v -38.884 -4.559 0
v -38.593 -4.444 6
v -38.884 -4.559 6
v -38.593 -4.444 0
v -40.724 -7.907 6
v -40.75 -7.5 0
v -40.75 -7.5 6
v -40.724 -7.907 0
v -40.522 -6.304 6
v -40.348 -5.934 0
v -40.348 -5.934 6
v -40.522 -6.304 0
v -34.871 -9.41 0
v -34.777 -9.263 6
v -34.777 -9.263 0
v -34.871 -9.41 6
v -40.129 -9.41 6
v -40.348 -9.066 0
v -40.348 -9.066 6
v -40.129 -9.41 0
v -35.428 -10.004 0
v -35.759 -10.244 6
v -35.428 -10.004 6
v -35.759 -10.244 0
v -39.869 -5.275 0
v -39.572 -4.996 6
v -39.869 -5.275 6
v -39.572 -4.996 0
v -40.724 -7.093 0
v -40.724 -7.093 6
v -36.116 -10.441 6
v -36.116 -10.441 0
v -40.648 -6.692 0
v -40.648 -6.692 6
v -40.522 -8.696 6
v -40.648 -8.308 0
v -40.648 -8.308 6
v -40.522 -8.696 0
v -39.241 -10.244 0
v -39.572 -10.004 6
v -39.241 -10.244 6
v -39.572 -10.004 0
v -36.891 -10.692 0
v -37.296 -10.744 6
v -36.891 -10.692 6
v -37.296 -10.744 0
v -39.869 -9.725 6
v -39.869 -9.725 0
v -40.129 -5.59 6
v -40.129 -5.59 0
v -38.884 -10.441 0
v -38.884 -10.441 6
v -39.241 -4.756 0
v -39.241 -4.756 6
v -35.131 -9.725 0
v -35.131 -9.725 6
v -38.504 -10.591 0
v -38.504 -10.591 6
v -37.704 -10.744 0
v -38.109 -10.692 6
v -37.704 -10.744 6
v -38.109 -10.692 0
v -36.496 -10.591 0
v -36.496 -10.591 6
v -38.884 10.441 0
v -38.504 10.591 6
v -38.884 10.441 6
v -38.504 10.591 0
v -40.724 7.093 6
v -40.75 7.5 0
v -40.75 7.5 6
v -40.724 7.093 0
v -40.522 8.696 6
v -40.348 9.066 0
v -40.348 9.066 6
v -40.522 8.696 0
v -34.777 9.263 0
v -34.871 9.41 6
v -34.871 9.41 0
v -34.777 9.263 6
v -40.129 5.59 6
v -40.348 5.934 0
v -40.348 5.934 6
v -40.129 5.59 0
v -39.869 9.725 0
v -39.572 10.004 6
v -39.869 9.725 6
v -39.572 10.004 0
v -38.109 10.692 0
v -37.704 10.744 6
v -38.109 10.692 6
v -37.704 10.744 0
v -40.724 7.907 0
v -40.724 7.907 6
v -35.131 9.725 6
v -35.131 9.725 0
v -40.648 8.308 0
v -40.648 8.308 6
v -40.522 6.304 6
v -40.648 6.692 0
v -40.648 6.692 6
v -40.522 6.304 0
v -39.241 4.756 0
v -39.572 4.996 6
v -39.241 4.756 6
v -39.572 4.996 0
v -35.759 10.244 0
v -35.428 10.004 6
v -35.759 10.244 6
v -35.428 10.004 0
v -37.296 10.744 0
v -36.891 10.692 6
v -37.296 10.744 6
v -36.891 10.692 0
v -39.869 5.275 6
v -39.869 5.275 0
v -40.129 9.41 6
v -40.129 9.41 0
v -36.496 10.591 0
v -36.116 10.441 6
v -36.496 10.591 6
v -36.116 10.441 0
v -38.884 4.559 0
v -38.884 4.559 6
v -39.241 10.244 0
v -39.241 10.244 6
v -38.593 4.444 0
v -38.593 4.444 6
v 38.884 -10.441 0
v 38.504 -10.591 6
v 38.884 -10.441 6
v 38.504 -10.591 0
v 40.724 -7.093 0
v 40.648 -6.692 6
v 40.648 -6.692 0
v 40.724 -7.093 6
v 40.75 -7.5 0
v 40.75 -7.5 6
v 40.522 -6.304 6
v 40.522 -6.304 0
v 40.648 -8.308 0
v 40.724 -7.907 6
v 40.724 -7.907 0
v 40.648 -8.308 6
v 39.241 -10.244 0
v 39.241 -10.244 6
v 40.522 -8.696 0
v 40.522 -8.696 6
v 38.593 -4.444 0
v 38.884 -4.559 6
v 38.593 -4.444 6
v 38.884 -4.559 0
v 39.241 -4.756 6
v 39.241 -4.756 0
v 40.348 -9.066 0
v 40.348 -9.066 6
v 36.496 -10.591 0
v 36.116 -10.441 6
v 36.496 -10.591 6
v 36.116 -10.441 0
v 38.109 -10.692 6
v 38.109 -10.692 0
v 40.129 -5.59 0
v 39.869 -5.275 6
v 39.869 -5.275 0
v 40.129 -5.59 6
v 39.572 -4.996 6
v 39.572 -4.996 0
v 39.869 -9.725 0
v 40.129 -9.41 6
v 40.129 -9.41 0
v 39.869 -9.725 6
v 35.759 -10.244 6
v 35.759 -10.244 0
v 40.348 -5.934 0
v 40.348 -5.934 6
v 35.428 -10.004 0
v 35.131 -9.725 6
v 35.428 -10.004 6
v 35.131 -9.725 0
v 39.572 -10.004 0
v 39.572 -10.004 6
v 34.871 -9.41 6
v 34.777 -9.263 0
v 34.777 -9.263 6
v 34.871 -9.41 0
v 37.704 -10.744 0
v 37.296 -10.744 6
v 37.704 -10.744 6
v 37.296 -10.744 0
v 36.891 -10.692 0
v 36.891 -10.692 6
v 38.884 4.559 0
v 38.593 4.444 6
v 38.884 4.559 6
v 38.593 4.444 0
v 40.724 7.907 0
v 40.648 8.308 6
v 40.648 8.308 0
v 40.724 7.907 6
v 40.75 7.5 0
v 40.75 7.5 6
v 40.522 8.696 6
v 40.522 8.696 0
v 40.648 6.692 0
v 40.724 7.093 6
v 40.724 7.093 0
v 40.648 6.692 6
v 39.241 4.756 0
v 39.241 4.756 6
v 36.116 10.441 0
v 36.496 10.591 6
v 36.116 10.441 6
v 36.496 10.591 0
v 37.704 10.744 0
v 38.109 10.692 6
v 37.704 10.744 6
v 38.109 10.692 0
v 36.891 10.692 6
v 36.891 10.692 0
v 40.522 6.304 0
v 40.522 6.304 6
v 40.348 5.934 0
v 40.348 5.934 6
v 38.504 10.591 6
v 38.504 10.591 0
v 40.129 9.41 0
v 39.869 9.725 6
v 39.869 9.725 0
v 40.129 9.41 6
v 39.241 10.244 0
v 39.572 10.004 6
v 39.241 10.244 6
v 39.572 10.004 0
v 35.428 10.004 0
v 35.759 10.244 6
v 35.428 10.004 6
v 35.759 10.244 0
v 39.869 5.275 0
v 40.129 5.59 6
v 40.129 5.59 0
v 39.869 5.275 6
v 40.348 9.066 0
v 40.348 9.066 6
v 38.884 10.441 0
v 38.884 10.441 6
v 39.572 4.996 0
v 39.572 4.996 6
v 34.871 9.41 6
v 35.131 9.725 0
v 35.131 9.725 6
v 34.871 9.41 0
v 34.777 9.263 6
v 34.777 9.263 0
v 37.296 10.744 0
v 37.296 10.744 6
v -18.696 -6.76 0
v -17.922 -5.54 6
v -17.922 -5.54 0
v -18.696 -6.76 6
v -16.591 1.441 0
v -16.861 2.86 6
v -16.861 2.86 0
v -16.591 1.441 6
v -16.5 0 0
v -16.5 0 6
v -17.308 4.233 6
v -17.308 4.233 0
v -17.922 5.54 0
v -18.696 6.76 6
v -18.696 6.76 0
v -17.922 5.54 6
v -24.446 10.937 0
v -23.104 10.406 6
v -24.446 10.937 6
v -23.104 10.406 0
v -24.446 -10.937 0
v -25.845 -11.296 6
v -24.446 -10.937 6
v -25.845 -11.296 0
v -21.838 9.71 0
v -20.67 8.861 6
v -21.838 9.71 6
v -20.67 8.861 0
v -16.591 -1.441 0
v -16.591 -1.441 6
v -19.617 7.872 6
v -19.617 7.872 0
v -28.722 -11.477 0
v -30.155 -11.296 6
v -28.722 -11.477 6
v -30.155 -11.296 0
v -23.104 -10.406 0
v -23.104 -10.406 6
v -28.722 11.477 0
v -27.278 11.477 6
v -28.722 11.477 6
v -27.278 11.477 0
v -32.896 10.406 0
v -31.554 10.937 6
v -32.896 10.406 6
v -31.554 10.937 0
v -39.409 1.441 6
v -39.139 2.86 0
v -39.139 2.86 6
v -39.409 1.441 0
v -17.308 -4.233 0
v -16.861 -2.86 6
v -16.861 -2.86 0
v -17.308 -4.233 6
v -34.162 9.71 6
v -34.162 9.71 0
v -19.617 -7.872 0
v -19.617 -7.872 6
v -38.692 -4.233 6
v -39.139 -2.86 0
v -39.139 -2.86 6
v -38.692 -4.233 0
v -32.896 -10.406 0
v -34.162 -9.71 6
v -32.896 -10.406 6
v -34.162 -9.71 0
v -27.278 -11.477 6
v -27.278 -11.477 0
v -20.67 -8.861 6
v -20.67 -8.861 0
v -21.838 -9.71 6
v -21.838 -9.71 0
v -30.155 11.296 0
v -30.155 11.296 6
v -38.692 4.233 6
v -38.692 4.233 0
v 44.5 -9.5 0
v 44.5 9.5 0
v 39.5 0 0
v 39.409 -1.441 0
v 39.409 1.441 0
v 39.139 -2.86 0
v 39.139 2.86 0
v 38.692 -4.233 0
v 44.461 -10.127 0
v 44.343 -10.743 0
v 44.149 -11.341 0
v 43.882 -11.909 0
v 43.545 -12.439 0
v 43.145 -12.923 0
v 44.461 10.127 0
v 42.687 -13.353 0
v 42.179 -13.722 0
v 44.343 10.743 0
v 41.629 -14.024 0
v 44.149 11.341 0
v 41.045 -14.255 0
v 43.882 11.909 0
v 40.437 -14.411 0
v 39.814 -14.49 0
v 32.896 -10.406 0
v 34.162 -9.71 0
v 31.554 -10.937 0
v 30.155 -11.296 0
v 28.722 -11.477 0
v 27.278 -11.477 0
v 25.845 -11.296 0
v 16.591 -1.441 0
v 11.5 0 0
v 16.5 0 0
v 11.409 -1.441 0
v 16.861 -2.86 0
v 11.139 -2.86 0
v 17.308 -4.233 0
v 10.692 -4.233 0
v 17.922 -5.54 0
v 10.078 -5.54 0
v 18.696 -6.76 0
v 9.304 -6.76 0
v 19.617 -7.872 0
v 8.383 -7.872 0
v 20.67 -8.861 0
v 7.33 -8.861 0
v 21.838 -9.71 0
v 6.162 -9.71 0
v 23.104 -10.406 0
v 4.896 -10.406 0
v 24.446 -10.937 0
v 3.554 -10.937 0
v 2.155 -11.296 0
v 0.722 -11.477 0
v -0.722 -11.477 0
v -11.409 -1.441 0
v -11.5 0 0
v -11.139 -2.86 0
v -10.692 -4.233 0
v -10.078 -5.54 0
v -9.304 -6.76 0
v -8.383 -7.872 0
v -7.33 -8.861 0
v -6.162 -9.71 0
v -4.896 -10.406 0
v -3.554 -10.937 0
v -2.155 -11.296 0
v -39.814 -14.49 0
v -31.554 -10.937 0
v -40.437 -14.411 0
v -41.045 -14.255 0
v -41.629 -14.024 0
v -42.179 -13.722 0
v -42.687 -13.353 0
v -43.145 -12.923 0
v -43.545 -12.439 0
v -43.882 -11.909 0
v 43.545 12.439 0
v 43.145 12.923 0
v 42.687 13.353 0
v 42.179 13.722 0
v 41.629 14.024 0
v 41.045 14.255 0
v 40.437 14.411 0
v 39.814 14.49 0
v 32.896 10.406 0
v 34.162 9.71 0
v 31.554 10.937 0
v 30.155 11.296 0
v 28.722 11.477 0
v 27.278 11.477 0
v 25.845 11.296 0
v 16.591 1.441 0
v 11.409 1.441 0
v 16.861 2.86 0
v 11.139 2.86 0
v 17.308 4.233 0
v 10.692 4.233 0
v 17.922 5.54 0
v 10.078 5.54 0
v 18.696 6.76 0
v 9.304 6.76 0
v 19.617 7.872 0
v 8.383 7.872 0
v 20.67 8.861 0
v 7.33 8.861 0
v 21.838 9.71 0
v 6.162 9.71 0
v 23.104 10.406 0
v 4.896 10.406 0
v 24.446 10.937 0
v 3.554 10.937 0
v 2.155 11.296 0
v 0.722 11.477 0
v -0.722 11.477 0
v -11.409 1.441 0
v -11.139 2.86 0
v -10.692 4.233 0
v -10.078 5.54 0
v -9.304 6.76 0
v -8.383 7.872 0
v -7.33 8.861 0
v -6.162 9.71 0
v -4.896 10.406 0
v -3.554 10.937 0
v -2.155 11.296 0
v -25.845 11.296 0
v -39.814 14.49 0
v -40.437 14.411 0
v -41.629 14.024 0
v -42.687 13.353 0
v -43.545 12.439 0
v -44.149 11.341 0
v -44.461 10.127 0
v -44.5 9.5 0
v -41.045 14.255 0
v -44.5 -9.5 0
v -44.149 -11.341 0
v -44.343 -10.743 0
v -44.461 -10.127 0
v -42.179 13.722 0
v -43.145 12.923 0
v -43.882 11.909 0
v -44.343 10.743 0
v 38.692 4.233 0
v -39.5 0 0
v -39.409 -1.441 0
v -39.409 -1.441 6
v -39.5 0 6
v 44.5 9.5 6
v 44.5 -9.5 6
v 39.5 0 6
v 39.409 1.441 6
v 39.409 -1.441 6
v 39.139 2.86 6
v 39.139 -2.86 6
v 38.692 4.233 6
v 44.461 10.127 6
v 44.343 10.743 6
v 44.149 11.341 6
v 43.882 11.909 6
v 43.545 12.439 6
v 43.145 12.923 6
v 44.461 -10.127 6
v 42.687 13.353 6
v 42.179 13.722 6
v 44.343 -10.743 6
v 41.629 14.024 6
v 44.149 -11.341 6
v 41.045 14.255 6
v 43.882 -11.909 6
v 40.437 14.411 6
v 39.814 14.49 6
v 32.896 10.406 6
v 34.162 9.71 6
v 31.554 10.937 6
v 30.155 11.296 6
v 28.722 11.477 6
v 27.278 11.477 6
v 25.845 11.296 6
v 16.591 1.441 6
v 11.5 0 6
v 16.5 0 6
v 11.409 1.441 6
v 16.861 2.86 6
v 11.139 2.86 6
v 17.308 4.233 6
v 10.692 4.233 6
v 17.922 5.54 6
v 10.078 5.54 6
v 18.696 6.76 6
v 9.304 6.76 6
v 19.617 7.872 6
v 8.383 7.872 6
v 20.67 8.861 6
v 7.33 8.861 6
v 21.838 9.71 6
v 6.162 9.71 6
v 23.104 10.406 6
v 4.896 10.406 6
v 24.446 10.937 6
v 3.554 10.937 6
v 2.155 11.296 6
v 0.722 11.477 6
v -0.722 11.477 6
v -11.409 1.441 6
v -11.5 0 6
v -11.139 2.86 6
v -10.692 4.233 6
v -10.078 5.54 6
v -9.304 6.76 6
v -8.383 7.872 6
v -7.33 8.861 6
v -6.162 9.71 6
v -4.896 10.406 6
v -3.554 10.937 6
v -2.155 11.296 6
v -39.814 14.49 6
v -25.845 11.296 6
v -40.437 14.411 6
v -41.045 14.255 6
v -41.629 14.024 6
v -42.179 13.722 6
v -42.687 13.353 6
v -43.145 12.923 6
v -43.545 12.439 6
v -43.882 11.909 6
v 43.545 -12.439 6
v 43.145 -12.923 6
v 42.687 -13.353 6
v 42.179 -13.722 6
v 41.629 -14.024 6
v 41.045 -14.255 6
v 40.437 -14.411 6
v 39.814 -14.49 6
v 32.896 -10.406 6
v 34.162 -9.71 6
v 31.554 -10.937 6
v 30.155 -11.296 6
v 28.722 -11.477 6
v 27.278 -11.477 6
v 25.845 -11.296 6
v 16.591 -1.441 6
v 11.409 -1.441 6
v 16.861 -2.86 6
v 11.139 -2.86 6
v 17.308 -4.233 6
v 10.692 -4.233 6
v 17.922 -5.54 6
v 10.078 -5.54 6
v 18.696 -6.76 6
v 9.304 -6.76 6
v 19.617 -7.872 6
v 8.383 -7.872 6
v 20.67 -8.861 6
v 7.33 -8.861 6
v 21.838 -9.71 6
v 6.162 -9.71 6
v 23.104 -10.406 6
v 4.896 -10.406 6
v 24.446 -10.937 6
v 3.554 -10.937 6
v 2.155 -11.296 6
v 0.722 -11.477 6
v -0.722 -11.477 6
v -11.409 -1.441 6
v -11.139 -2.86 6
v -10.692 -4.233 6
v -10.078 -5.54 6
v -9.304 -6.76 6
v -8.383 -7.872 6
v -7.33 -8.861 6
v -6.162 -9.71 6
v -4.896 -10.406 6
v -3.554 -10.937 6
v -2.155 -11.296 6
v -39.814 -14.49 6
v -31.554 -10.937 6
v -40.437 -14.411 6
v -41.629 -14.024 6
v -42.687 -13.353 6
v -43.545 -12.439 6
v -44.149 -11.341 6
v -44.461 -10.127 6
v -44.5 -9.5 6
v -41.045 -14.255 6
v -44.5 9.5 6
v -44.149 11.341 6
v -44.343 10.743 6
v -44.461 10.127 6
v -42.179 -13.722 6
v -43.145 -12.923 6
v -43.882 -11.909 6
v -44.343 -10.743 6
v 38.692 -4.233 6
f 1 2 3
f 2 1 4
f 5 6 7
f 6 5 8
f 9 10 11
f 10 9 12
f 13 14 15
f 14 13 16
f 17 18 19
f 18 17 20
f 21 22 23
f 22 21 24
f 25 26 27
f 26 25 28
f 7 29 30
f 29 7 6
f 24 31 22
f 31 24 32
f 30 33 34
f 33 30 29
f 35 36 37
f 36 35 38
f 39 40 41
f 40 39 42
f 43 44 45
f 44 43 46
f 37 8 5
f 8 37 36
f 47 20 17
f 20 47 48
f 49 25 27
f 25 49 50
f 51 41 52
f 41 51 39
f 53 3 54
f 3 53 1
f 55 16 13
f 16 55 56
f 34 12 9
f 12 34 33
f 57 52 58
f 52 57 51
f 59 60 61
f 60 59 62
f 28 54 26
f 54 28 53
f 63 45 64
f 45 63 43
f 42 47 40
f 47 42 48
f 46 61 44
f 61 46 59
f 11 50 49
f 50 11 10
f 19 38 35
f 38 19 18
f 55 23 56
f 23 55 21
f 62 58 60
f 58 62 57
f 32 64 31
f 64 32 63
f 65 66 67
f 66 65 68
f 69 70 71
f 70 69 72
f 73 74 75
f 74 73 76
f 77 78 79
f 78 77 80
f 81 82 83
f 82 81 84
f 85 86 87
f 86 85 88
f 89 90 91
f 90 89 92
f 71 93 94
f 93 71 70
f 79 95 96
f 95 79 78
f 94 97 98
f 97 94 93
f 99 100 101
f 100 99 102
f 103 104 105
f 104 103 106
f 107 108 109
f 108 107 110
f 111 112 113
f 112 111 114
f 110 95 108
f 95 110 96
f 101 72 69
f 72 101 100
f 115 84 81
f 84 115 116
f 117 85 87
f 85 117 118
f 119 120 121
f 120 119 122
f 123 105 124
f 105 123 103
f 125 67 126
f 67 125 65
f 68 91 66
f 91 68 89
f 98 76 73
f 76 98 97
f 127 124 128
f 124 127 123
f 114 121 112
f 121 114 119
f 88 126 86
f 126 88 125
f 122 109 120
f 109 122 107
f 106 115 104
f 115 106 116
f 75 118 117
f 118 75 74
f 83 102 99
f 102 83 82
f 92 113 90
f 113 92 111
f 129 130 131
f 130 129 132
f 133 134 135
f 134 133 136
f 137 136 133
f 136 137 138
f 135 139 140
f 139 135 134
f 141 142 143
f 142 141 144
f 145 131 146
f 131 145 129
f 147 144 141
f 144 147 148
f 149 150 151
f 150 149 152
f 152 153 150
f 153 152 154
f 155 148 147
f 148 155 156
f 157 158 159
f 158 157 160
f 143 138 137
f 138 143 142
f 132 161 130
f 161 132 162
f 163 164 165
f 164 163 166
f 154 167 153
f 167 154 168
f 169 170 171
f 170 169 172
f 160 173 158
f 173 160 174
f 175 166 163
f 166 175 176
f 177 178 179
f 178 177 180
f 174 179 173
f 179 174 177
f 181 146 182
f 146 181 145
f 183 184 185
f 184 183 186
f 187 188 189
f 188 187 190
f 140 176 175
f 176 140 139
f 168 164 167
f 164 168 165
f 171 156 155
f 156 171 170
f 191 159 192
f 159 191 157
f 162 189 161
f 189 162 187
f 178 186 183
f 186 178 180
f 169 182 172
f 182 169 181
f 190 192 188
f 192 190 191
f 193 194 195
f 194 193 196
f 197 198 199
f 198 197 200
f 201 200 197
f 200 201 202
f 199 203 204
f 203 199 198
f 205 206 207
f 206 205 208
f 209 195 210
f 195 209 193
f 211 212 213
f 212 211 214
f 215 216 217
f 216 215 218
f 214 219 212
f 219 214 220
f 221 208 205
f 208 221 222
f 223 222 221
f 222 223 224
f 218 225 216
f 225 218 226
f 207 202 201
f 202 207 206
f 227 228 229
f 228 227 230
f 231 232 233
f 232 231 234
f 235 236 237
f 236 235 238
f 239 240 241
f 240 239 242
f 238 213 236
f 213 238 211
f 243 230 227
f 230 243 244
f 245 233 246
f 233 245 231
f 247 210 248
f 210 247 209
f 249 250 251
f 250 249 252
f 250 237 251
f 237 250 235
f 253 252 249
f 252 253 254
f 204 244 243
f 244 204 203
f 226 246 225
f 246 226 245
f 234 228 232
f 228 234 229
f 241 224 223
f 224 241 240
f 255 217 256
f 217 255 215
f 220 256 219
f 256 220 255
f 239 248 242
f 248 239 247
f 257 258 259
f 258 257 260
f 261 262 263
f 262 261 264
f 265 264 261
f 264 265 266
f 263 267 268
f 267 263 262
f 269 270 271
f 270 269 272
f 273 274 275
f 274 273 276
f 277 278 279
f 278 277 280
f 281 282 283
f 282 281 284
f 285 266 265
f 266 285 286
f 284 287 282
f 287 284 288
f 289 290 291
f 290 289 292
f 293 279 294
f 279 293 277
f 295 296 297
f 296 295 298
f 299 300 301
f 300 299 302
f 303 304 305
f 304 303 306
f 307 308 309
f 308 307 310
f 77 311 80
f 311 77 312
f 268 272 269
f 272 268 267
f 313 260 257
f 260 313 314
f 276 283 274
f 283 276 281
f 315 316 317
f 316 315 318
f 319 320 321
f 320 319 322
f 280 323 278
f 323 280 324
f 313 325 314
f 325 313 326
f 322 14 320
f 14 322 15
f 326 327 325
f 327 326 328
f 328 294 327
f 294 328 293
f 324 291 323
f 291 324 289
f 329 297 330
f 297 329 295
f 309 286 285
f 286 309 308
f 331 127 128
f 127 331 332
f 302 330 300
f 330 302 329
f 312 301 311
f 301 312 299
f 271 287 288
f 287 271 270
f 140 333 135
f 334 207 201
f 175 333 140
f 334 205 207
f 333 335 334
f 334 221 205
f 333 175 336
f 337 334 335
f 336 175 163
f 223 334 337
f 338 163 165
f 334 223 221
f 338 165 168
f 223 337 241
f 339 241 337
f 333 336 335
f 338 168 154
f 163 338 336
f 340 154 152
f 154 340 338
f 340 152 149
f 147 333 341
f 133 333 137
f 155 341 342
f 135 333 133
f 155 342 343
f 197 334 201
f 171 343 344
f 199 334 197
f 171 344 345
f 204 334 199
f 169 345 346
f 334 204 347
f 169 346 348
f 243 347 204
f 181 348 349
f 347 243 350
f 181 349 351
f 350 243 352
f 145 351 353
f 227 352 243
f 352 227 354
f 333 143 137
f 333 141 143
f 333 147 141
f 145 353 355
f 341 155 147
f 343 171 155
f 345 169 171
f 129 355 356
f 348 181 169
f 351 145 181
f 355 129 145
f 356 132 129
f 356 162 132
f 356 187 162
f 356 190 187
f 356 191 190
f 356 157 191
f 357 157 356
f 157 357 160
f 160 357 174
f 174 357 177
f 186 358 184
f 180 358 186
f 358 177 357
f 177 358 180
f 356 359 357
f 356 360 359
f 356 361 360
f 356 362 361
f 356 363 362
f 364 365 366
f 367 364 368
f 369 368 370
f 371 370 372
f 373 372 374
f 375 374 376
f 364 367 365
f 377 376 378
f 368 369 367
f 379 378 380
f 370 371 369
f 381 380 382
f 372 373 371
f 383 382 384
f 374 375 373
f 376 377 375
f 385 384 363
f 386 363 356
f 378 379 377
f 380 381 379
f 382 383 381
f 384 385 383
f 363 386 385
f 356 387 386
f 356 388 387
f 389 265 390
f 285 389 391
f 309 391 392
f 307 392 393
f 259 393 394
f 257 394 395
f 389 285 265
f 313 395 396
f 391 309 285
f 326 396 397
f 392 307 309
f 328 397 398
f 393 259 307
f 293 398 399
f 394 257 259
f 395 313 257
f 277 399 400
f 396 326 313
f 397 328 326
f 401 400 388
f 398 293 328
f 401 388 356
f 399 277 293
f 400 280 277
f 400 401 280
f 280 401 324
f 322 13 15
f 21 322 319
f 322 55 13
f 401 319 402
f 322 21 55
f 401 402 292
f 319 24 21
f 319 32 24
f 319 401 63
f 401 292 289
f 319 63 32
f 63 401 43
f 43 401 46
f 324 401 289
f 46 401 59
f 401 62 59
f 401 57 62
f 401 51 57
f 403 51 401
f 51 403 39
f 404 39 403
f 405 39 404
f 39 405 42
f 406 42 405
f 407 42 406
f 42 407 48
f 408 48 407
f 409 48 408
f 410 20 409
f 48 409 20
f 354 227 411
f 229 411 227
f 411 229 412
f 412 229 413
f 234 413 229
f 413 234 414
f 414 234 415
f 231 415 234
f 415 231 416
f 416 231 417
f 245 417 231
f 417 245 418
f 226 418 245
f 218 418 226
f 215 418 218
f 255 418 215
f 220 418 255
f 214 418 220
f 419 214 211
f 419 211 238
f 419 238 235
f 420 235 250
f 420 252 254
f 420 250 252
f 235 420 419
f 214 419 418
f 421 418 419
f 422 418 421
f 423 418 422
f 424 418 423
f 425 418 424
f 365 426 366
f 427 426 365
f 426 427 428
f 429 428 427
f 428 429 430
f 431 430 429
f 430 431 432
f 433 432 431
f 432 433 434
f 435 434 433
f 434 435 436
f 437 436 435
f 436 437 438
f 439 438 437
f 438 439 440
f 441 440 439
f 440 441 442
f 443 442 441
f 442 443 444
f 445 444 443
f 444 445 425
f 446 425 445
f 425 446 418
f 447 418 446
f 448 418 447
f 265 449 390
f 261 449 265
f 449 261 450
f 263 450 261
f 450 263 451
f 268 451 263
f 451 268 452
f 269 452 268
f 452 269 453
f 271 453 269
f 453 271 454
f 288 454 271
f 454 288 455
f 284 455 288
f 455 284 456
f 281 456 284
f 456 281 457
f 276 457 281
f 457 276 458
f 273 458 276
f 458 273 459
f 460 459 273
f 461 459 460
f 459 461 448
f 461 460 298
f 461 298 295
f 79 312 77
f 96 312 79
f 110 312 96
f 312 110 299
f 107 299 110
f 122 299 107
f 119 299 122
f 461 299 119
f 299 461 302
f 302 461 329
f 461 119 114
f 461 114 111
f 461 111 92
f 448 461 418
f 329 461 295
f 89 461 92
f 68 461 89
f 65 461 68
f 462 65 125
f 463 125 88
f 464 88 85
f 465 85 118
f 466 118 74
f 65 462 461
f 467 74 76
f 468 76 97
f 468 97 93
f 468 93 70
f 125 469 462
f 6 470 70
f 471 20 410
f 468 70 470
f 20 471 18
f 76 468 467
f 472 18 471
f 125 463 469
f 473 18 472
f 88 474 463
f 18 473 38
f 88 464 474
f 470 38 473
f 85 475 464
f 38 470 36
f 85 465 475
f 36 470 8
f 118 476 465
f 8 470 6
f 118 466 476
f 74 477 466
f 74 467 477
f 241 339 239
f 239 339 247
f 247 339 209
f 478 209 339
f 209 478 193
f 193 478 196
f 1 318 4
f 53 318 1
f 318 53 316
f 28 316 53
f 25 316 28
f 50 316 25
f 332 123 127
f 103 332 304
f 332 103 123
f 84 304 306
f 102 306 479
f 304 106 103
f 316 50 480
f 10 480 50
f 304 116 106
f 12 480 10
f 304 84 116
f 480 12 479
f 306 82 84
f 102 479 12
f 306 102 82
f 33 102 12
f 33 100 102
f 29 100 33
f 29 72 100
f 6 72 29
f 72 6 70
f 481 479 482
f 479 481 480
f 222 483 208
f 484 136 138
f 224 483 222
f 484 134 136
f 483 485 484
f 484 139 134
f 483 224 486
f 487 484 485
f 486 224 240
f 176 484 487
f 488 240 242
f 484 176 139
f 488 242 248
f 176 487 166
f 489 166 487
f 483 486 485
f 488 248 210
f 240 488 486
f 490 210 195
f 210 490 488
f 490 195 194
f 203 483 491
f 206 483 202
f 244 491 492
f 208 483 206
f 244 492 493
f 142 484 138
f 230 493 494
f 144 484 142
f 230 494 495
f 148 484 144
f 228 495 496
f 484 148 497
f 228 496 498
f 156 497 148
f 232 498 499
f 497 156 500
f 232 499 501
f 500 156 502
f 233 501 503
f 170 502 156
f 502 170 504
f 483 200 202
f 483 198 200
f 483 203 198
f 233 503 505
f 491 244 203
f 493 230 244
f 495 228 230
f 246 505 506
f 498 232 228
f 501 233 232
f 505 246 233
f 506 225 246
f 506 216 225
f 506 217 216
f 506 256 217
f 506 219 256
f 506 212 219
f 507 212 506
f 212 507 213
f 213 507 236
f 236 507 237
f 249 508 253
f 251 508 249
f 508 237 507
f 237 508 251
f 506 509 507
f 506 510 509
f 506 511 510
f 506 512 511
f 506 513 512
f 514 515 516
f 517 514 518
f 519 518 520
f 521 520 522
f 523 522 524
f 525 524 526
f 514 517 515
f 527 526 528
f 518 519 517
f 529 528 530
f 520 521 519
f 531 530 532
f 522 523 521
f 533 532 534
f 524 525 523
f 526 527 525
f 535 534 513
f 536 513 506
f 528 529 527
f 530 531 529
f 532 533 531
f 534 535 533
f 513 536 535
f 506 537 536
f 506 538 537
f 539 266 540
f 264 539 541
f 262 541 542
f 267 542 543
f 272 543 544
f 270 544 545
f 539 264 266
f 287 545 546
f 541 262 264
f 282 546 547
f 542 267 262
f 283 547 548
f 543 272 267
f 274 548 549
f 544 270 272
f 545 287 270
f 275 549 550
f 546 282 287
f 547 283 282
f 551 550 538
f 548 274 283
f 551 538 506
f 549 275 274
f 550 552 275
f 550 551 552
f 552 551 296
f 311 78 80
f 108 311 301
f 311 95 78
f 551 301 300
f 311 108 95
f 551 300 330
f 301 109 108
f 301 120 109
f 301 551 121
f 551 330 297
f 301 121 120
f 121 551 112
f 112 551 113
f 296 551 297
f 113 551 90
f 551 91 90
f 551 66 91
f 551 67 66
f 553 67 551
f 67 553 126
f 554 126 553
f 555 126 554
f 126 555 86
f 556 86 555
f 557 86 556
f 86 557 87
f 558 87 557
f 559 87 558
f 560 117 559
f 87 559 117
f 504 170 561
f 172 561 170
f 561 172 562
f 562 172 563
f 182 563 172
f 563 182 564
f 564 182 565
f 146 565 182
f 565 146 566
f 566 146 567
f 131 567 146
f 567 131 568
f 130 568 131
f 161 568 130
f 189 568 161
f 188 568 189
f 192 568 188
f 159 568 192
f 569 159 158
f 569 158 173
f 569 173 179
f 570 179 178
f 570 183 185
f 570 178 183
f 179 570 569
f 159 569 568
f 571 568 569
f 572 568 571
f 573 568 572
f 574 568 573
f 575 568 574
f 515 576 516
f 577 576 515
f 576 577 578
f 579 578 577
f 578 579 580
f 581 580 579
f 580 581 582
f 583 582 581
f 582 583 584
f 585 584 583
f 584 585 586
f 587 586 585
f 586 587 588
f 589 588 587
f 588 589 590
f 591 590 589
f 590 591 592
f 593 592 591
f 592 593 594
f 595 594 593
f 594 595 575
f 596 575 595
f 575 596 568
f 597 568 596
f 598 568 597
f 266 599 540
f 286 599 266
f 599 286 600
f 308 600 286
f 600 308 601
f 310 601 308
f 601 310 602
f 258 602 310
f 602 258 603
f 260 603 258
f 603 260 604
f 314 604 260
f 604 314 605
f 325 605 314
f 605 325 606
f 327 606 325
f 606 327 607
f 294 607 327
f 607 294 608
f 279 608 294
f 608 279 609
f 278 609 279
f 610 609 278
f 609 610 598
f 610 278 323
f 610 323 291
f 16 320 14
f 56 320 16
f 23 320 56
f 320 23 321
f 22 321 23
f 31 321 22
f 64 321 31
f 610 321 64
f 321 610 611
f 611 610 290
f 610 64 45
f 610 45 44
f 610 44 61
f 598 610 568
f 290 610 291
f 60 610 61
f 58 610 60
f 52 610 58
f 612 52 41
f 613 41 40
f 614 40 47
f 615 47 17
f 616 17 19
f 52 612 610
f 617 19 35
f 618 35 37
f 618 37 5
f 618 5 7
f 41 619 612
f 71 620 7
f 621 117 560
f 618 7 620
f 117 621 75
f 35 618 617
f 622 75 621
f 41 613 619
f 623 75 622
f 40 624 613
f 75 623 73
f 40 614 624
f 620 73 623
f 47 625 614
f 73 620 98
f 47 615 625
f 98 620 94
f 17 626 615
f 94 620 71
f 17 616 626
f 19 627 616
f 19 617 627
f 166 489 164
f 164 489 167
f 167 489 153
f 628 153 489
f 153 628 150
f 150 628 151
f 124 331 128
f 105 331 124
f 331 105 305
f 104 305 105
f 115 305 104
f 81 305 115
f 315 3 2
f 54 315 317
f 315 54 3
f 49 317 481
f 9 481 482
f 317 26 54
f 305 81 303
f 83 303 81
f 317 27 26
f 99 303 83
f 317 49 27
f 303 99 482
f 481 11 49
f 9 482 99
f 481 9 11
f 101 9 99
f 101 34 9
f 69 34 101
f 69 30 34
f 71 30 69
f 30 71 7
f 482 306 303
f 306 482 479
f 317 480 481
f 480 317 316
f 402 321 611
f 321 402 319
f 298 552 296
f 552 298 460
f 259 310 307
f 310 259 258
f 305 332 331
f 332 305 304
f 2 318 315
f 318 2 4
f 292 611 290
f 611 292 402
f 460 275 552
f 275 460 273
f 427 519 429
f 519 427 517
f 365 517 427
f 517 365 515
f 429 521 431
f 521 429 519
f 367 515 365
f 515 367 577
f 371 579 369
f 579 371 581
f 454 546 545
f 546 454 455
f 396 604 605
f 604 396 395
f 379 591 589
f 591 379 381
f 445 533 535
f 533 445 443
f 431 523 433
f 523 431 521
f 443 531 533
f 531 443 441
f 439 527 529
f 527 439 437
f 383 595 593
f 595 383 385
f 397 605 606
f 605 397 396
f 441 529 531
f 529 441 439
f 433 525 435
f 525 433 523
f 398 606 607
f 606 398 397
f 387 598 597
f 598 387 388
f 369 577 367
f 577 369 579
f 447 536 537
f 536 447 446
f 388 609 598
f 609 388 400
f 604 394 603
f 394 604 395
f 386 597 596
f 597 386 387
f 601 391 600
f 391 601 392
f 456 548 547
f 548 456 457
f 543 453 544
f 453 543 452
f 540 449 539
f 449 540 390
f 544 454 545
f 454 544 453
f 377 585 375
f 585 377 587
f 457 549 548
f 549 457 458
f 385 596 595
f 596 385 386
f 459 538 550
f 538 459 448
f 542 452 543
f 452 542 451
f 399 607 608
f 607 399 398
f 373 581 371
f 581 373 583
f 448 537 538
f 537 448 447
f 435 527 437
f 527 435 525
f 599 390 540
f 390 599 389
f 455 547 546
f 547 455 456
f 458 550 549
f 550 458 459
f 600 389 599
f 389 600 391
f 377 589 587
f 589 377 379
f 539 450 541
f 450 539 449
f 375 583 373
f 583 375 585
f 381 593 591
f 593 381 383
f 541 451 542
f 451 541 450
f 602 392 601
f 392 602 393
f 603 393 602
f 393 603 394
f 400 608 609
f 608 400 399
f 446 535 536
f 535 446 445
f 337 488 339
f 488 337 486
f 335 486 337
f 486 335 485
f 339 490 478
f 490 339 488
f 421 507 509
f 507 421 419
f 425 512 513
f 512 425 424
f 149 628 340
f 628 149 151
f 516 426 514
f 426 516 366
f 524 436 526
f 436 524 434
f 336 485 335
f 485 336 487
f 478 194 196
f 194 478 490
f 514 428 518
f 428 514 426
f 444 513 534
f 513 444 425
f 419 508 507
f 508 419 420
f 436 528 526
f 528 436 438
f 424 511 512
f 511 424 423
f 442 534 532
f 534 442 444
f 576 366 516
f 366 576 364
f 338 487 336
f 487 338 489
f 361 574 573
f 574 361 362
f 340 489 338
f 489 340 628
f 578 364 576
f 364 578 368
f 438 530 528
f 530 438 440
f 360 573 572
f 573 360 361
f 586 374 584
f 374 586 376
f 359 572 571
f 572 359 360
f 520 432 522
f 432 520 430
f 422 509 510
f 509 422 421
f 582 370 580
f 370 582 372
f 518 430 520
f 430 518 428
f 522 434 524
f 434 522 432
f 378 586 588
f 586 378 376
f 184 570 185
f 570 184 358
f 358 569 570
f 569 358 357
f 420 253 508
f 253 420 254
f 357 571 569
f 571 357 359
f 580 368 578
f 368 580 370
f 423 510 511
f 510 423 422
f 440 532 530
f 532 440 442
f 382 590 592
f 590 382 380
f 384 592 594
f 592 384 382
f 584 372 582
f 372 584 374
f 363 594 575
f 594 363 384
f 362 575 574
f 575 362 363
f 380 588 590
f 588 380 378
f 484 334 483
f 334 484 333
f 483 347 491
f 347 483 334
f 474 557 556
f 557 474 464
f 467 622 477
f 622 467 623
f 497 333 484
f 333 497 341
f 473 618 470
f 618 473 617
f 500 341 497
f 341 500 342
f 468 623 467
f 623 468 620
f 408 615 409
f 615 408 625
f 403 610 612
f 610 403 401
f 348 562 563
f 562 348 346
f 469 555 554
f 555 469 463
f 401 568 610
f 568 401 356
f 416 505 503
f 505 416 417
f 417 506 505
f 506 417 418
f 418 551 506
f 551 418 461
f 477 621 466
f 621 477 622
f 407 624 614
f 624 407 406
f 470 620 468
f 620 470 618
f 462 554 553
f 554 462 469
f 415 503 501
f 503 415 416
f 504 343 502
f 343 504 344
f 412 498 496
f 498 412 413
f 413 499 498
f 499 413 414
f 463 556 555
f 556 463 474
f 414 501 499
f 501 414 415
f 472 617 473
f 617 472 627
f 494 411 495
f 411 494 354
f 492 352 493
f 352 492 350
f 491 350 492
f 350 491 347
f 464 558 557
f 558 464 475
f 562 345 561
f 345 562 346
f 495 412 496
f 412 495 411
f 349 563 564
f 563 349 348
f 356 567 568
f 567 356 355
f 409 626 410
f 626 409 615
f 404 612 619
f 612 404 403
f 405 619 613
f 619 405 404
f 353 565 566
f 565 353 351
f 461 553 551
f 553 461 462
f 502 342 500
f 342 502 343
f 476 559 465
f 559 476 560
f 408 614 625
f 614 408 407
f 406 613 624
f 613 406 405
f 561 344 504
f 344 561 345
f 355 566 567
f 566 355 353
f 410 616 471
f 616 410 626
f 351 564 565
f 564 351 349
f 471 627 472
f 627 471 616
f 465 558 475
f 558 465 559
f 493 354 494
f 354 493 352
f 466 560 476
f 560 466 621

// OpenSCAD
$fn = 50;

difference() {
	union() {
		hull() {
			translate(v = [-39.5, 9.5, 0]) {
				cylinder(h = 6, r = 5);
			}
			translate(v = [39.5, 9.5, 0]) {
				cylinder(h = 6, r = 5);
			}
			translate(v = [-39.5, -9.5, 0]) {
				cylinder(h = 6, r = 5);
			}
			translate(v = [39.5, -9.5, 0]) {
				cylinder(h = 6, r = 5);
			}
		}
	}
	union() {
		translate(v = [-37.5, -7.5, -100.0]) {
			cylinder(h = 200, r = 3.25);
		}
		translate(v = [-37.5, 7.5, -100.0]) {
			cylinder(h = 200, r = 3.25);
		}
		translate(v = [37.5, -7.5, -100.0]) {
			cylinder(h = 200, r = 3.25);
		}
		translate(v = [37.5, 7.5, -100.0]) {
			cylinder(h = 200, r = 3.25);
		}
		translate(v = [-37.5, -7.5, -100.0]) {
			cylinder(h = 200, r = 1.8);
		}
		translate(v = [-37.5, 7.5, -100.0]) {
			cylinder(h = 200, r = 1.8);
		}
		translate(v = [37.5, -7.5, -100.0]) {
			cylinder(h = 200, r = 1.8);
		}
		translate(v = [37.5, 7.5, -100.0]) {
			cylinder(h = 200, r = 1.8);
		}
		translate(v = [-28.0, 0, 0.0]) {
			cylinder(h = 6, r = 11.5);
		}
		cylinder(h = 6, r = 11.5);
		translate(v = [28.0, 0, 0.0]) {
			cylinder(h = 6, r = 11.5);
		}
	}
}
